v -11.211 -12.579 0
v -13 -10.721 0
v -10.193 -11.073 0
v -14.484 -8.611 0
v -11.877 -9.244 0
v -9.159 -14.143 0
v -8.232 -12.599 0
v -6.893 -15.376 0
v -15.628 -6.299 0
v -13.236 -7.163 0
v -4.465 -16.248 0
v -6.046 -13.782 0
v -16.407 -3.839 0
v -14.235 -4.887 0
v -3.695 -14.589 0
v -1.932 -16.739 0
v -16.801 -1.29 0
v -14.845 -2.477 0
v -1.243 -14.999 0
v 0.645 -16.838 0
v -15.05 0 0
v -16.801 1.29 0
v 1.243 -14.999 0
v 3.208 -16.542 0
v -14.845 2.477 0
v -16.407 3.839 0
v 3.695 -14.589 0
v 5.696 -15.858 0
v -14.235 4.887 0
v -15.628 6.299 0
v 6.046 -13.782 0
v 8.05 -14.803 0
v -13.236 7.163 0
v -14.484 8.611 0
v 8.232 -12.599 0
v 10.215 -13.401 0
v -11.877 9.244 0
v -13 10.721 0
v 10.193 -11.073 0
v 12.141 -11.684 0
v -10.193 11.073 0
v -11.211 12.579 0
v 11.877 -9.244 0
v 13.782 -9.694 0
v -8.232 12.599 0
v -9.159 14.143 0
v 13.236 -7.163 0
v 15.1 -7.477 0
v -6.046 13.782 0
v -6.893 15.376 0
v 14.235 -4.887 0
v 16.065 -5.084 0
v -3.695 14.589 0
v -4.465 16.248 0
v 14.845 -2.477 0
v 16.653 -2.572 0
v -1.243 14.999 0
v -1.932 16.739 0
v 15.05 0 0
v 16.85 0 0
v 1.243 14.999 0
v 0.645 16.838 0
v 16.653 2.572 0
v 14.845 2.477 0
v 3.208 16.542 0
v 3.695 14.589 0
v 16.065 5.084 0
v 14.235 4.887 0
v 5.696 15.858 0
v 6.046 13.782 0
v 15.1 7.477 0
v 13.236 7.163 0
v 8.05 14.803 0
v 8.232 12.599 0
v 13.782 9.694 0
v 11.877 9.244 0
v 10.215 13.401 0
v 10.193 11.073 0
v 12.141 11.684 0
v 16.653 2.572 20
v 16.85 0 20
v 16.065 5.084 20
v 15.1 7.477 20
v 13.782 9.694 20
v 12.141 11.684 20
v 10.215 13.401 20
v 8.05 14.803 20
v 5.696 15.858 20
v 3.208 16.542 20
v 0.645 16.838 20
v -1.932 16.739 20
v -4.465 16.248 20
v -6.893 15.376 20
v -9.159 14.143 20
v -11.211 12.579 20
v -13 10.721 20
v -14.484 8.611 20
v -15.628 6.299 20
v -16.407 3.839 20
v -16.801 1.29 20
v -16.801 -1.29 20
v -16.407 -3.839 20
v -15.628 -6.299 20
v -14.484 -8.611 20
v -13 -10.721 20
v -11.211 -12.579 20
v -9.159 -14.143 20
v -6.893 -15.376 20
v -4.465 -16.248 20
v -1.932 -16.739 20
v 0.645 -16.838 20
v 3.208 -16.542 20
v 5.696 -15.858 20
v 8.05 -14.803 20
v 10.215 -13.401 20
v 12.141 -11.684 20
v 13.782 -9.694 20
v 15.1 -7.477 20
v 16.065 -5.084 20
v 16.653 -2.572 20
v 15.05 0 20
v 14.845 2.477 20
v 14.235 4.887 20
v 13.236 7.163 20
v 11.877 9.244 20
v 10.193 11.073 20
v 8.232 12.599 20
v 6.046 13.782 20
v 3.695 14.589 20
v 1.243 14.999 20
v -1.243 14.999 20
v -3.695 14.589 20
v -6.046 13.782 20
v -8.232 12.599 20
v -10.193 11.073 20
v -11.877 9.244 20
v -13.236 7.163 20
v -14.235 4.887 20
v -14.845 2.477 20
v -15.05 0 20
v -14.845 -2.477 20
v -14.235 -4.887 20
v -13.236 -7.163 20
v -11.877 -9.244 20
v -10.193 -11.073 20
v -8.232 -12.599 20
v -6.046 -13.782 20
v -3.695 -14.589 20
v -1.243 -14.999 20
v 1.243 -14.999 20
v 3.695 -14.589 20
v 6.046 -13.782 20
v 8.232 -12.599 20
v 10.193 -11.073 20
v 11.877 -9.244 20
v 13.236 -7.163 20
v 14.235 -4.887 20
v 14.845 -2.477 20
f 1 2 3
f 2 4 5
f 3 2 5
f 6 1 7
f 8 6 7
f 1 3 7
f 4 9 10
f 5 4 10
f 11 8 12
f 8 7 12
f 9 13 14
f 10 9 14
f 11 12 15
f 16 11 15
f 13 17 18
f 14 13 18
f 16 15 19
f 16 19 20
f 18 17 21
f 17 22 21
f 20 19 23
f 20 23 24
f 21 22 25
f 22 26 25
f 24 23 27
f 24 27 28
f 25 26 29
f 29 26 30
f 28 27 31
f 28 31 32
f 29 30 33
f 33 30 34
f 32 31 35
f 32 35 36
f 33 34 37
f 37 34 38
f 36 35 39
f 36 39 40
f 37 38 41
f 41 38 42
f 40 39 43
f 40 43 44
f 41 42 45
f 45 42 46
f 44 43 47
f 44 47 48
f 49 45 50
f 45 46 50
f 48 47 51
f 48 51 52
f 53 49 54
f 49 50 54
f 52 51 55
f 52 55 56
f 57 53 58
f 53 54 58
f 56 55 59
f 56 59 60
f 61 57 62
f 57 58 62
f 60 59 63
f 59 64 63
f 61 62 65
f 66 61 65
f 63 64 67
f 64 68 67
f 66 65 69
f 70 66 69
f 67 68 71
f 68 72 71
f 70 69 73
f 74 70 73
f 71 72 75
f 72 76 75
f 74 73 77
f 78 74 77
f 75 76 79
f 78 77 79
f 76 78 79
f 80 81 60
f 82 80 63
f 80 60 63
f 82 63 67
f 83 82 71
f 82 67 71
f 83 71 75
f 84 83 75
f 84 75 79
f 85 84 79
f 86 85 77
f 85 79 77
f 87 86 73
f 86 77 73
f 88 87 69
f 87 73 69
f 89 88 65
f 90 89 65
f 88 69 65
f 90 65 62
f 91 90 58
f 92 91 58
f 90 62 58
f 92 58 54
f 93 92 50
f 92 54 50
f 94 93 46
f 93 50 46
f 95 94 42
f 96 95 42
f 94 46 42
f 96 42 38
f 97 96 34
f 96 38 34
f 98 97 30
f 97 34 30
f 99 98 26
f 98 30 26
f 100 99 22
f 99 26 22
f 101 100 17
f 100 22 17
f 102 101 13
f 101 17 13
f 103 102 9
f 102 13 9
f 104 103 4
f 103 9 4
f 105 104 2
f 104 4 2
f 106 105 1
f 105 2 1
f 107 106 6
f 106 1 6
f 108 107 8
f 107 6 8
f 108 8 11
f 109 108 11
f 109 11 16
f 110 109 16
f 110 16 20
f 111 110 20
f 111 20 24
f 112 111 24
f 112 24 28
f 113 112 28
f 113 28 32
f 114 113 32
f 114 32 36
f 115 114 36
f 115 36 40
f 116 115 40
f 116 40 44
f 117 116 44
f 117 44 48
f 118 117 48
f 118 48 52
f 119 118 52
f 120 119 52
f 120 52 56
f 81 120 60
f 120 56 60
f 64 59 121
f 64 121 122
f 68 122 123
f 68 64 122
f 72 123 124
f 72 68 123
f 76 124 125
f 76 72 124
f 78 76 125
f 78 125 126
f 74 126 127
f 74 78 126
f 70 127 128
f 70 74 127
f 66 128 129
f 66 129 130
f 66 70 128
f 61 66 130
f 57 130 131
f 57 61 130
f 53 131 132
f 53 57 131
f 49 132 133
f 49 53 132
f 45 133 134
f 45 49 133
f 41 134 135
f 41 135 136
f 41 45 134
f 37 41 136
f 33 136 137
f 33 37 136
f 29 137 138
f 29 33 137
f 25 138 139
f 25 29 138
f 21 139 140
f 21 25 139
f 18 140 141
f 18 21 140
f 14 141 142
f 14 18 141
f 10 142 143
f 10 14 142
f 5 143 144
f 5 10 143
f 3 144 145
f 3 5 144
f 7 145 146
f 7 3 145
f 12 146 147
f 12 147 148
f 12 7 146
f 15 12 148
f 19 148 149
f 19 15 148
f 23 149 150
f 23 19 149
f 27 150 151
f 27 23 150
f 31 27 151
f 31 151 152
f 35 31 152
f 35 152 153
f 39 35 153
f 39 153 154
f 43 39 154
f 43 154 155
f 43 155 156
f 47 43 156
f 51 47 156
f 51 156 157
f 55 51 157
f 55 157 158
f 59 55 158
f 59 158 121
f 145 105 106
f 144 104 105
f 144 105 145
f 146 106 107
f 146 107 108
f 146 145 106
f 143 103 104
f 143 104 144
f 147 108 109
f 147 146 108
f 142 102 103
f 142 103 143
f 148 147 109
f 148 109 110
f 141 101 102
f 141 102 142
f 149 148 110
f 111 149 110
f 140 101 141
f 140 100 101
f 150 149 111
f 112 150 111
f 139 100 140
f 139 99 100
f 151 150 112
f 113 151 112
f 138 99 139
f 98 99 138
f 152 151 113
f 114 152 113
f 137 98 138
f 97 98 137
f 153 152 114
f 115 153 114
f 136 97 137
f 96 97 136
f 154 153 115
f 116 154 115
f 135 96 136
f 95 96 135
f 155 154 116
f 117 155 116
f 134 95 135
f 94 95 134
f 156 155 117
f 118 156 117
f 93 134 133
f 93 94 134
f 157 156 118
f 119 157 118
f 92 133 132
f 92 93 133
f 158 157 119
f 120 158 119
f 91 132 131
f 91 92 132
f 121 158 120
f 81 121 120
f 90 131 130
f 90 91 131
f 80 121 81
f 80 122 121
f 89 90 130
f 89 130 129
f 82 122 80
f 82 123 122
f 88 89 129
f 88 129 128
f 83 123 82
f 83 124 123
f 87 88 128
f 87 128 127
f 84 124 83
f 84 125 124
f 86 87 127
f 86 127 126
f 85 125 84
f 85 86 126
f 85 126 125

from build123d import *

# Parameters (mm, degrees)
SKETCH1_R           = 17
SKETCH1_R_2         = 15
BOSS_EXTRUDE1_DEPTH = 20
MOVE_FACE1_BY       = 0.15
MOVE_FACE2_BY       = 0.05


with BuildPart() as part:
    # Sketch1 → Boss-Extrude1 (new body)
    with BuildSketch(Plane.XY):
        Circle(SKETCH1_R)
        Circle(SKETCH1_R_2, mode=Mode.SUBTRACT)
    extrude(amount=BOSS_EXTRUDE1_DEPTH)

    # Move Face1: a curved face moved inward by 0.15
    add(Solid.thicken(part.faces().sort_by_distance((-17, 0, 10))[0], -MOVE_FACE1_BY), mode=Mode.SUBTRACT)

    # Move Face2: a curved face moved inward by 0.05
    add(Solid.thicken(part.faces().sort_by_distance((-15, 0, 10))[0], -MOVE_FACE2_BY), mode=Mode.SUBTRACT)


solid = part.part
